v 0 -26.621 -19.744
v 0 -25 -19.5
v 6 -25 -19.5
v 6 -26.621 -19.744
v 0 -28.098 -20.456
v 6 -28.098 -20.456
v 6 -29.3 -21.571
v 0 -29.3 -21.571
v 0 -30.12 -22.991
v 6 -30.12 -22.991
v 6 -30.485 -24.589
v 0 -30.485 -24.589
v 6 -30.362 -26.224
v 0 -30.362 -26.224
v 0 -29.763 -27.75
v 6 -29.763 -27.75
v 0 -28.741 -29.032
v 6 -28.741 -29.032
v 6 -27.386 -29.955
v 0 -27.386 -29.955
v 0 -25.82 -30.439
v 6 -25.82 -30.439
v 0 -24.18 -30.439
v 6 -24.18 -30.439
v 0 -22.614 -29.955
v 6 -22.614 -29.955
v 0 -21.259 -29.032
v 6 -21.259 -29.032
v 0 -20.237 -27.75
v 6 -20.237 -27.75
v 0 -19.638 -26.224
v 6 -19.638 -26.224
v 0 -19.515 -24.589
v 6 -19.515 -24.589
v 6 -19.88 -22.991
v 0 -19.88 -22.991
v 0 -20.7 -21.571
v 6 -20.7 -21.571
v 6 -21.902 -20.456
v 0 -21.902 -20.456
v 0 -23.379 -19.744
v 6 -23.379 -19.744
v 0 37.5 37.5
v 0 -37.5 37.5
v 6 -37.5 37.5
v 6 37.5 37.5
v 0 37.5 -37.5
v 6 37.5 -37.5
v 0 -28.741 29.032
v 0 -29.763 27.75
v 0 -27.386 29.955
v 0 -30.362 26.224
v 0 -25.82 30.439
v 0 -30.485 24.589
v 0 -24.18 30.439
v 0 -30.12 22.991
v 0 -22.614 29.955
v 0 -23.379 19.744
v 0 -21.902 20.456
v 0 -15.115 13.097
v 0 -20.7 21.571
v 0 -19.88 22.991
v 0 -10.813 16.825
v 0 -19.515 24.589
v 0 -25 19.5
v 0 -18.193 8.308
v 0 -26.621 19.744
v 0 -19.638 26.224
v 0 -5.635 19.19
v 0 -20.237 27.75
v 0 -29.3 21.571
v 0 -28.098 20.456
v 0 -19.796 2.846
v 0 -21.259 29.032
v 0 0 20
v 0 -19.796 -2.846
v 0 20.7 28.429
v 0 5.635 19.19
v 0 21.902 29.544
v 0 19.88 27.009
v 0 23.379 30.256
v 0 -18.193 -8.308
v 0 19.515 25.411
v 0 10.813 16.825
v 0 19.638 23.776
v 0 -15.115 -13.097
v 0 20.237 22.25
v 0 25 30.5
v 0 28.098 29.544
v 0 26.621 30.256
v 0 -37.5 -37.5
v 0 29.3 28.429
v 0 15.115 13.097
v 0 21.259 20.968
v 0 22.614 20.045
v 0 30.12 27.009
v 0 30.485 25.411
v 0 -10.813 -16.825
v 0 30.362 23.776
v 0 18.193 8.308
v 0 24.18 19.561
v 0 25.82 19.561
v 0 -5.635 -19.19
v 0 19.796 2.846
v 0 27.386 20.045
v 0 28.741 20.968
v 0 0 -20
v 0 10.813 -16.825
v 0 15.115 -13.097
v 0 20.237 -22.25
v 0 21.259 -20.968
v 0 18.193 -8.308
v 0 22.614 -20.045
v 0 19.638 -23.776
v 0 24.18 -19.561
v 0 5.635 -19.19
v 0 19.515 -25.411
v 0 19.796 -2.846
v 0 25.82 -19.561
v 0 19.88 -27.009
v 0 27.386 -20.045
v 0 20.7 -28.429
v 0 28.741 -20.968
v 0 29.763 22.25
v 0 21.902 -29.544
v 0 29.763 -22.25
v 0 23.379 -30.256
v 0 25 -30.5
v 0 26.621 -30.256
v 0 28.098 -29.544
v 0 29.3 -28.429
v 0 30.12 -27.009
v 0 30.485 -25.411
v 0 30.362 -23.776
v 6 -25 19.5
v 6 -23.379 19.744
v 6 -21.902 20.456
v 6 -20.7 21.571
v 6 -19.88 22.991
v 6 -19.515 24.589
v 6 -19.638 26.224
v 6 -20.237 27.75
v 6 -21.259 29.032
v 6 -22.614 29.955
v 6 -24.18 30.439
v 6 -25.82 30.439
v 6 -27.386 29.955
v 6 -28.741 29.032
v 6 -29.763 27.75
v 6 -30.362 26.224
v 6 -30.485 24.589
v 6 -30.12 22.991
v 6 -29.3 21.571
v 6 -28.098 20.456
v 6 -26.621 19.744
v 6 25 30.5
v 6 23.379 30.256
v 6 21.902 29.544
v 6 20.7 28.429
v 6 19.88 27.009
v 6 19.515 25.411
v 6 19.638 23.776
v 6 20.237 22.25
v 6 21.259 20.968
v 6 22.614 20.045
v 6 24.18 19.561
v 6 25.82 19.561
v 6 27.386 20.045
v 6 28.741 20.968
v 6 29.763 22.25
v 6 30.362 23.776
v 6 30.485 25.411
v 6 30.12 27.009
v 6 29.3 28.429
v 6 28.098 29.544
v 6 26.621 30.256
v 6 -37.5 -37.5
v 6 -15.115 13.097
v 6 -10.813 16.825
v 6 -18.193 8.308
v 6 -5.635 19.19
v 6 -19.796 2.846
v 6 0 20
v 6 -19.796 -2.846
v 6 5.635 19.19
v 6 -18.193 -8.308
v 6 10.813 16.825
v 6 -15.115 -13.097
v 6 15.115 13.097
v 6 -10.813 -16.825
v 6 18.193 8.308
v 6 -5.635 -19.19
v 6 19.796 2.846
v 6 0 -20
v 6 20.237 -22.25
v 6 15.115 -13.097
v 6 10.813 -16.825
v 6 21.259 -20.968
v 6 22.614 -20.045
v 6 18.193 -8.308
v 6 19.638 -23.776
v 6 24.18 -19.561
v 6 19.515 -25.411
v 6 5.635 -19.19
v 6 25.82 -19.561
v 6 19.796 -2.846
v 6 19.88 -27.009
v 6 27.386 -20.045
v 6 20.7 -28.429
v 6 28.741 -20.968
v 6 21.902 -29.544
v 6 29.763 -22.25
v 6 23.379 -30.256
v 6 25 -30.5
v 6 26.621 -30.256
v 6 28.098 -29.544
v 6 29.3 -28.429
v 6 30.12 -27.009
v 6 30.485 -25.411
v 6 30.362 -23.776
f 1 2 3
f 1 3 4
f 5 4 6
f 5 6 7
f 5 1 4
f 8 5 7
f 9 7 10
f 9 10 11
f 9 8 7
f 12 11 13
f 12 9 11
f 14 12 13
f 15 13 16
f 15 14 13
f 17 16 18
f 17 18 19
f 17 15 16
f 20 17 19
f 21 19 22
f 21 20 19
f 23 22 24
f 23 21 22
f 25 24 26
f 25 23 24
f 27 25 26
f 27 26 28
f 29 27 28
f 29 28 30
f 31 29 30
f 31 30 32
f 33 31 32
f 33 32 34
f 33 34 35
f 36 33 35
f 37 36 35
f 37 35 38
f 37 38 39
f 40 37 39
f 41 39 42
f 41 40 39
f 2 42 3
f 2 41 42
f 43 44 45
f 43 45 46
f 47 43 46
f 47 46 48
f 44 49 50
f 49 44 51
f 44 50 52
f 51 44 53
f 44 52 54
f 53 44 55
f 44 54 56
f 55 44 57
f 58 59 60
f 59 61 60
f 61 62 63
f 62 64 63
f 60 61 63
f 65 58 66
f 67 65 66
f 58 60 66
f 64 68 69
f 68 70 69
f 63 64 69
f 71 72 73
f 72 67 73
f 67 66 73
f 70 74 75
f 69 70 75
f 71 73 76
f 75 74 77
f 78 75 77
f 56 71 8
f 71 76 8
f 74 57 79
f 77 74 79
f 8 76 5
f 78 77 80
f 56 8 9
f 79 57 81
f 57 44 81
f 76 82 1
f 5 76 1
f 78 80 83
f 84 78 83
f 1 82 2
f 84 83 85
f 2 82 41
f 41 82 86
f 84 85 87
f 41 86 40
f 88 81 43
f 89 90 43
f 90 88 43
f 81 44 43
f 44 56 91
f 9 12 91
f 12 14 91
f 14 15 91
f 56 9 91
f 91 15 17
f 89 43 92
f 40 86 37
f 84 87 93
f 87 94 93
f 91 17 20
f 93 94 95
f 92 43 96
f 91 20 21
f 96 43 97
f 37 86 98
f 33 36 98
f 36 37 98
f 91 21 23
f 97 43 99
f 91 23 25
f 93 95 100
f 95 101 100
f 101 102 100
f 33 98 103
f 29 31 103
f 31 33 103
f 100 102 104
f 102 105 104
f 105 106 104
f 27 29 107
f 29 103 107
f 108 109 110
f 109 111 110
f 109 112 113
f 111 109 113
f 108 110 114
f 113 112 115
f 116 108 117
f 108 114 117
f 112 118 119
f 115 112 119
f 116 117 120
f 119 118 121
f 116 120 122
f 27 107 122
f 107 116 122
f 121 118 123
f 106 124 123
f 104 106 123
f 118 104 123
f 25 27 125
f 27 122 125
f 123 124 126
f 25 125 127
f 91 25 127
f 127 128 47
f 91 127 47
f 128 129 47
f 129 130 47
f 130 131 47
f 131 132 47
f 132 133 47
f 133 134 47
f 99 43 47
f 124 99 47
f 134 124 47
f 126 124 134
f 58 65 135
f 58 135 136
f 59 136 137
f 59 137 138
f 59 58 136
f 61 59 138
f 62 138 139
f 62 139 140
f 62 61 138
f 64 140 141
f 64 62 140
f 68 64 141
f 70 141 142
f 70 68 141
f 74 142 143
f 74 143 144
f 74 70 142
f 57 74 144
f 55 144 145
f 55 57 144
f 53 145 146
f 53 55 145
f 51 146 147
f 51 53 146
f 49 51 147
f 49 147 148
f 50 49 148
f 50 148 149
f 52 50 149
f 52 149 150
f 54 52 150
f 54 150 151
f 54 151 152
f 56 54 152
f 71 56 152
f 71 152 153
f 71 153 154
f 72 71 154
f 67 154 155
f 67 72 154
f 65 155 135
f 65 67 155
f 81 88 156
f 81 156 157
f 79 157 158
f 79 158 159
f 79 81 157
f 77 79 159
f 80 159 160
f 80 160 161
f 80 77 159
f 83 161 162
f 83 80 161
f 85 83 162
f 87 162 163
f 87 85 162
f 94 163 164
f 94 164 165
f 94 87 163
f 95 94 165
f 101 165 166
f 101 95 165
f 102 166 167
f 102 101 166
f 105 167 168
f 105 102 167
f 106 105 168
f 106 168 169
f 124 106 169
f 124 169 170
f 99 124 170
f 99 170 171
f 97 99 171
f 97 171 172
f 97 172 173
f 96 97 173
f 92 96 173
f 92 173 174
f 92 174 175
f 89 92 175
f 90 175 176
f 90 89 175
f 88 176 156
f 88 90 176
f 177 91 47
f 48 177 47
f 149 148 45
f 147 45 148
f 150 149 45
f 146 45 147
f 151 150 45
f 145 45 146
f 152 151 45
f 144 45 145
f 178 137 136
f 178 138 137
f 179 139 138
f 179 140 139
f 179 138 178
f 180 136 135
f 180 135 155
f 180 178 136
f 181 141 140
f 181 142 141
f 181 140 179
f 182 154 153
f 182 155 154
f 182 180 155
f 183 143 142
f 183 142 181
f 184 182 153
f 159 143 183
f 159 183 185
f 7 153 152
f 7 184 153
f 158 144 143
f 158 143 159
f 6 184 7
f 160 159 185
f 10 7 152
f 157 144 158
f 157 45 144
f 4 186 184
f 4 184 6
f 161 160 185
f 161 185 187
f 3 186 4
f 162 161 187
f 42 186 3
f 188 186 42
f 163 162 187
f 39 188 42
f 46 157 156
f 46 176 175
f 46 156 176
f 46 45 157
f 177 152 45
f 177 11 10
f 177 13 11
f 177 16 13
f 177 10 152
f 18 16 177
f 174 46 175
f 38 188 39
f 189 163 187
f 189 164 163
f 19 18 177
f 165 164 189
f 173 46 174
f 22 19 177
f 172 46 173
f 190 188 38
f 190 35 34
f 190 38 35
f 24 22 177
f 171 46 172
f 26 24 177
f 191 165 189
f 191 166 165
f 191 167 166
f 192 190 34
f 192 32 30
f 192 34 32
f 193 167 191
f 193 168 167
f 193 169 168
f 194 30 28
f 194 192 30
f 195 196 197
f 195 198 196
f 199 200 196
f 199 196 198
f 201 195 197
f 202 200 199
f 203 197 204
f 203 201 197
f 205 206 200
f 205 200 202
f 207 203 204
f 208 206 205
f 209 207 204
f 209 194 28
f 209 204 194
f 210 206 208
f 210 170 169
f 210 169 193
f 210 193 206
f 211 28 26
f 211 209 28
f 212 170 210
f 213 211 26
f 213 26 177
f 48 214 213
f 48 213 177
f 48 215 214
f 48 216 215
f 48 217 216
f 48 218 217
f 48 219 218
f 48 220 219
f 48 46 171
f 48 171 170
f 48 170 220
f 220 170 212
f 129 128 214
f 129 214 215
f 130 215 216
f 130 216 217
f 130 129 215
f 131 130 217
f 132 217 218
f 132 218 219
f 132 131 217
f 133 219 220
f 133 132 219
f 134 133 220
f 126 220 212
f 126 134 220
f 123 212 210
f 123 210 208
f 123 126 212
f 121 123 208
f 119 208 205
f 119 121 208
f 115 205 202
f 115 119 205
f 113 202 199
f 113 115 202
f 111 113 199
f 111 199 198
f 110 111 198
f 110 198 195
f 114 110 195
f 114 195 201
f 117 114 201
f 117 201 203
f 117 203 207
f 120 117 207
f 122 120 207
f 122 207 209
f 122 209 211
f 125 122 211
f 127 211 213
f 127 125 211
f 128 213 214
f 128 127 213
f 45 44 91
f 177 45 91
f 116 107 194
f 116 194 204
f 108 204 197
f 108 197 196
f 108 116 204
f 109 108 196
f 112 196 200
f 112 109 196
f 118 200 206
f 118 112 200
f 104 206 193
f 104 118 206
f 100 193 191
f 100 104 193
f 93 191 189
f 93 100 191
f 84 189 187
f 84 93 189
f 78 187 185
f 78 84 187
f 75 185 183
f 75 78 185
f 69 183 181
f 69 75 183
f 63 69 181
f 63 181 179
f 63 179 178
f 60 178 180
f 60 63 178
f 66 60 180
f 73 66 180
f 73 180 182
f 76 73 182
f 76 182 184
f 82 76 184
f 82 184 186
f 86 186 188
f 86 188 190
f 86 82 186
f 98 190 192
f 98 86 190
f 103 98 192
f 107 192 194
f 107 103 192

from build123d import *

# Parameters (mm, degrees)
SKETCH1_W           = 75
SKETCH1_H           = 75
SKETCH1_R           = 5.5
SKETCH1_R_2         = 20
BOSS_EXTRUDE1_DEPTH = 6


with BuildPart() as part:
    # Sketch1 → Boss-Extrude1 (new body)
    with BuildSketch(Plane(origin=(0, 0, 0), x_dir=(0, 0, -1), z_dir=(1, 0, 0))):
        Rectangle(SKETCH1_W, SKETCH1_H)
        with Locations((25, 25)):
            Circle(SKETCH1_R, mode=Mode.SUBTRACT)
        with Locations(Location((-25, 25, 0), (0, 0, 180))):
            Circle(SKETCH1_R, mode=Mode.SUBTRACT)
        with Locations(Location((25, -25, 0), (0, 0, 180))):
            Circle(SKETCH1_R, mode=Mode.SUBTRACT)
        with Locations((-25, -25)):
            Circle(SKETCH1_R, mode=Mode.SUBTRACT)
        Circle(SKETCH1_R_2, mode=Mode.SUBTRACT)
    extrude(amount=BOSS_EXTRUDE1_DEPTH)


solid = part.part
